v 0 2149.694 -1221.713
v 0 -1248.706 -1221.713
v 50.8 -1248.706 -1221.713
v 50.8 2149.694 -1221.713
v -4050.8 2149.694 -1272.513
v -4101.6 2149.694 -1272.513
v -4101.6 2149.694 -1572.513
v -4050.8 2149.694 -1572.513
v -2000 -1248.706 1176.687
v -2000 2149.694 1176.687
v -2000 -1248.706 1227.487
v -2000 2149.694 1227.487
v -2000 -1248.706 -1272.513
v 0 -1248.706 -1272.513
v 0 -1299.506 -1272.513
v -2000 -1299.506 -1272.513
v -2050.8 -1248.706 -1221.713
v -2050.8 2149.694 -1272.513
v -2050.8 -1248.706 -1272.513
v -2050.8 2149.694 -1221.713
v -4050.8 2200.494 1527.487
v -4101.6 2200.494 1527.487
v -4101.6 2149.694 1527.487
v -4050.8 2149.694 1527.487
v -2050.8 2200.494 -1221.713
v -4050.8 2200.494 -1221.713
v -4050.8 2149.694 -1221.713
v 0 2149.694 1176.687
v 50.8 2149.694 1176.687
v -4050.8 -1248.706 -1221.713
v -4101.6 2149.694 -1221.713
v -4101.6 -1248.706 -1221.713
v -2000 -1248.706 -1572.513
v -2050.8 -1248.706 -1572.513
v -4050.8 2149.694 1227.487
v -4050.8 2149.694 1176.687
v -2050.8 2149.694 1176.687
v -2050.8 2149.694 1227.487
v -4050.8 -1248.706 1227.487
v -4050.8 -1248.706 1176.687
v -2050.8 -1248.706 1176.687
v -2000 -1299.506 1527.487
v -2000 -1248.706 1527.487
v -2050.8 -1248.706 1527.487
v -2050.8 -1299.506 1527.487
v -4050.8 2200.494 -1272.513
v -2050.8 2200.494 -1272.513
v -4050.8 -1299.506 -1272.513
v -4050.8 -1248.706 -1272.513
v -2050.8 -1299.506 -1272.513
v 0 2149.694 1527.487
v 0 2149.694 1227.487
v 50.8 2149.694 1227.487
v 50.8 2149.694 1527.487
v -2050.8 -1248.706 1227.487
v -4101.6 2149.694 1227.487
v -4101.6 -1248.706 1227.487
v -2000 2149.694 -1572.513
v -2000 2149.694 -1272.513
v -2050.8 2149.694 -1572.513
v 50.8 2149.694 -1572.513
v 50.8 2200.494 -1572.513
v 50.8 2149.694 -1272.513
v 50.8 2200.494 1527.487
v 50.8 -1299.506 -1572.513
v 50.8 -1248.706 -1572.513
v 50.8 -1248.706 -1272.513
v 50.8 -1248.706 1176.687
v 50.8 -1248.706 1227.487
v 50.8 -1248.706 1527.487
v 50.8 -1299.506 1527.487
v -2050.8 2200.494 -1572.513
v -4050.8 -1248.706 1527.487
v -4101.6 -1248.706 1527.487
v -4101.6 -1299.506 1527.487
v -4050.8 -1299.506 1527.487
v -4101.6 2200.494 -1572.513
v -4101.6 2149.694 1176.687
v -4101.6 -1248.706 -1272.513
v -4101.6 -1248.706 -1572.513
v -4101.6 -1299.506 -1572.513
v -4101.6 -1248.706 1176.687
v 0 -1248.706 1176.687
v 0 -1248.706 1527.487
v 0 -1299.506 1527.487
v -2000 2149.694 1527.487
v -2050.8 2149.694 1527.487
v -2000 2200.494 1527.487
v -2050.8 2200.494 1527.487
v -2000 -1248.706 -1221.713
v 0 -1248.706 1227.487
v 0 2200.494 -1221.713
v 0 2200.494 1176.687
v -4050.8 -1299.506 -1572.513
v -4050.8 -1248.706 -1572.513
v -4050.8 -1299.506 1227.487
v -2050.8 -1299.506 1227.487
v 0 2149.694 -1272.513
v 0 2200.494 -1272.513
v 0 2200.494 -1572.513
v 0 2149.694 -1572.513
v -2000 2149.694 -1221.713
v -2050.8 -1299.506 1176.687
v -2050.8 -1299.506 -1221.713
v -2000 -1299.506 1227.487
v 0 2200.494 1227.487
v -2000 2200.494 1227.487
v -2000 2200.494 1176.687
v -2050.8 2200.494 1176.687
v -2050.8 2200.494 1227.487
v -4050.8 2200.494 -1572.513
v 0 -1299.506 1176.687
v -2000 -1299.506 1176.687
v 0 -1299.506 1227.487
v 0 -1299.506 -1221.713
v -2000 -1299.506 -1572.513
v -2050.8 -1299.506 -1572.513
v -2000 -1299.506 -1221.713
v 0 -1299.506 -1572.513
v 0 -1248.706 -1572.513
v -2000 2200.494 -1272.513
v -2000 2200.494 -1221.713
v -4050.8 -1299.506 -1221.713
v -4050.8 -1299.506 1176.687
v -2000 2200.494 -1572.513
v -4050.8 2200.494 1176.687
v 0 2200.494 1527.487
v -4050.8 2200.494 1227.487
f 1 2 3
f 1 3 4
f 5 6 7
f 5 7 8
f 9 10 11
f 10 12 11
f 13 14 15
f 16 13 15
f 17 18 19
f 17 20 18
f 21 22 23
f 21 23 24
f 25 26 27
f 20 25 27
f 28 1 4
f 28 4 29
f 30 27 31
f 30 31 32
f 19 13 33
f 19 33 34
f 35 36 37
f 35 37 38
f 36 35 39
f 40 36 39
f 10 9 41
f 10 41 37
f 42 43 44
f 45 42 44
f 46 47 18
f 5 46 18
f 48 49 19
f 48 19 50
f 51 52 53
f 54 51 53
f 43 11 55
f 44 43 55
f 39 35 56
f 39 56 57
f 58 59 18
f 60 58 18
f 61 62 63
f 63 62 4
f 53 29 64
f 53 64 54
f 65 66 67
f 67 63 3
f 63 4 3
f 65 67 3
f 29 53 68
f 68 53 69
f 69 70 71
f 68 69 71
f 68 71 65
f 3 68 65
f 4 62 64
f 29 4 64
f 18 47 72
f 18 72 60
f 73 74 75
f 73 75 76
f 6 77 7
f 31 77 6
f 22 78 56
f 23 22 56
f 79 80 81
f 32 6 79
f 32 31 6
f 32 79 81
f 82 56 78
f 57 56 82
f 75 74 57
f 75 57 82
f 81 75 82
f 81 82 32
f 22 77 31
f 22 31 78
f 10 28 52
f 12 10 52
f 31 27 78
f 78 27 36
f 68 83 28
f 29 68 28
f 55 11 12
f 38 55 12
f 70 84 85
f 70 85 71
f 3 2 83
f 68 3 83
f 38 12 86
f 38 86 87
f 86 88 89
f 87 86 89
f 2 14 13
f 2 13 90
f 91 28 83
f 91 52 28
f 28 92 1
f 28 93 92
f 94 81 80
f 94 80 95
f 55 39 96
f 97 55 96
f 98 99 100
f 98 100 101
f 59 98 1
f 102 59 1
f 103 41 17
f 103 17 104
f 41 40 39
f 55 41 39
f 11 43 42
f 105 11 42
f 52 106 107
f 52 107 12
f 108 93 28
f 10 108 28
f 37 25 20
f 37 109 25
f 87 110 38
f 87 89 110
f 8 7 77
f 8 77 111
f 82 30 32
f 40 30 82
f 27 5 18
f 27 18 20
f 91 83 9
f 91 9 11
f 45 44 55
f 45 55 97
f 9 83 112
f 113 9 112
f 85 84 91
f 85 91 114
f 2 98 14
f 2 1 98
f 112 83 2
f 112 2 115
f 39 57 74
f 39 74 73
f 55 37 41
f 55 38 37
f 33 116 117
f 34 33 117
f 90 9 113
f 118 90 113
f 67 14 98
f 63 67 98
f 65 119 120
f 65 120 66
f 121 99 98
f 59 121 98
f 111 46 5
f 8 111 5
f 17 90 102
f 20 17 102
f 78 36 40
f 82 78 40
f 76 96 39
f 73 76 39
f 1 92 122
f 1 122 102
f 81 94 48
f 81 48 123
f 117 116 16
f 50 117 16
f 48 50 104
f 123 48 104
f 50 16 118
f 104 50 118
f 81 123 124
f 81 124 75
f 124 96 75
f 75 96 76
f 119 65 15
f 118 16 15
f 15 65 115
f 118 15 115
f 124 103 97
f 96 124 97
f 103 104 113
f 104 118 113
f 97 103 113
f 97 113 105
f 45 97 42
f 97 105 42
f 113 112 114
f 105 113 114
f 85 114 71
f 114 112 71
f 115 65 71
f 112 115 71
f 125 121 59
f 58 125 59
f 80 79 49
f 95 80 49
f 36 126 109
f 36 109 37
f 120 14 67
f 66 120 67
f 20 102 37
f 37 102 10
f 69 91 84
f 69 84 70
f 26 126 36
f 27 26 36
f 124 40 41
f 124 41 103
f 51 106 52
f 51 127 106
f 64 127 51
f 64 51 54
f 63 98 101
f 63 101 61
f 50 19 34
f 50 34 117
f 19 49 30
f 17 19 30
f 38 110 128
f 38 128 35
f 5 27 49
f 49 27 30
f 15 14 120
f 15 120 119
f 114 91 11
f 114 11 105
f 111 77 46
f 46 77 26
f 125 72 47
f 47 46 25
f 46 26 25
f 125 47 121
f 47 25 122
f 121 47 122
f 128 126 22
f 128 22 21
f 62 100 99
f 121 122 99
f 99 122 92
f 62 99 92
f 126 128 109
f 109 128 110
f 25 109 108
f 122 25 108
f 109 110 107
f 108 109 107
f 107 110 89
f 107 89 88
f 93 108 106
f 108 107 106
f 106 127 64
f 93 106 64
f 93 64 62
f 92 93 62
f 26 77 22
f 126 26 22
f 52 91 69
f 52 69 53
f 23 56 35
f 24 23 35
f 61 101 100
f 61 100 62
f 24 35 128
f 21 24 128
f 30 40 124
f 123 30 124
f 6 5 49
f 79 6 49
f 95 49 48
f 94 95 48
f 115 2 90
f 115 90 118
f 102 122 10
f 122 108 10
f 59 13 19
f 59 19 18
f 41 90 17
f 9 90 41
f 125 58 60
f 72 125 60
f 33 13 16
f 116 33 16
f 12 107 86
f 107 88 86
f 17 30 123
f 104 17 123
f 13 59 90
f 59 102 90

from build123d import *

# Parameters (mm, degrees)
F0_W      = 3500
F0_H      = 2500
F0_W_2    = 3398.4
F0_H_2    = 2398.4
F1_DEPTH  = 50.8
F2_W      = 50.8
F2_H      = 50.8
F3_DEPTH  = 300
F4_W      = 50.8
F4_H      = 50.8
F5_DEPTH  = 300
F6_W      = 50.8
F6_H      = 50.8
F7_DEPTH  = 1000
F9_W      = 50.8
F9_H      = 50.8
F10_DEPTH = 2000
F11_W     = 3500
F11_H     = 2500
F11_W_2   = 3398.4
F11_H_2   = 2398.4
F12_DEPTH = 50.8
F13_W     = 50.8
F13_H     = 50.8
F14_DEPTH = 300
F15_W     = 50.8
F15_H     = 50.8
F16_DEPTH = 300


with BuildPart() as f1:
    # F0 (on Right) → F1 (new body)
    with BuildSketch(Plane.YZ):
        with Locations((450.493536, -22.512738)):
            Rectangle(F0_W, F0_H)
        with Locations((450.493536, -22.512738)):
            Rectangle(F0_W_2, F0_H_2, mode=Mode.SUBTRACT)
    extrude(amount=F1_DEPTH)

    # F2 (on face) → F3 (join)
    with BuildSketch(Plane.XY.offset(1227.487262)):
        with Locations((25.4, -1274.106464)):
            Rectangle(F2_W, F2_H)
        with Locations((25.4, 2175.093536)):
            Rectangle(F2_W, F2_H)
    extrude(amount=F3_DEPTH)

    # F4 (on face) → F5 (join)
    with BuildSketch(Plane(origin=(0, 0, -1272.512738), x_dir=(1, 0, 0), z_dir=(0, 0, -1))):
        with Locations((25.4, 1274.106464)):
            Rectangle(F4_W, F4_H)
        with Locations((25.4, -2175.093536)):
            Rectangle(F4_W, F4_H)
    extrude(amount=F5_DEPTH)

    # F6 (on face) → F7 (join)
    with BuildSketch(Plane(origin=(0, 0, 0), x_dir=(0, -1, 0), z_dir=(-1, 0, 0))):
        with Locations((-2175.093536, 1202.087262)):
            Rectangle(F6_W, F6_H)
        with Locations((1274.106464, 1202.087262)):
            Rectangle(F6_W, F6_H)
        with Locations((-2175.093536, -1247.112738)):
            Rectangle(F6_W, F6_H)
        with Locations((1274.106464, -1247.112738)):
            Rectangle(F6_W, F6_H)
    extrude(amount=F7_DEPTH)

    # F8: F1 across face


with BuildPart() as f1_1:
    add(f1.part)
    add(f1.part.mirror(Plane(origin=(-1000, 2175.093536, 1202.087262), x_dir=(0, -1, 0), z_dir=(-1, 0, 0))))

    # F9 (on face) → F10 (join)
    with BuildSketch(Plane(origin=(-2050.8, 0, 0), x_dir=(0, -1, 0), z_dir=(-1, 0, 0))):
        with Locations((-2175.093536, 1202.087262)):
            Rectangle(F9_W, F9_H)
        with Locations((1274.106464, 1202.087262)):
            Rectangle(F9_W, F9_H)
        with Locations((-2175.093536, -1247.112738)):
            Rectangle(F9_W, F9_H)
        with Locations((1274.106464, -1247.112738)):
            Rectangle(F9_W, F9_H)
    extrude(amount=F10_DEPTH)

    # F11 (on face) → F12 (join)
    with BuildSketch(Plane(origin=(-4050.8, 0, 0), x_dir=(0, -1, 0), z_dir=(-1, 0, 0))):
        with Locations((-450.493536, -22.512738)):
            Rectangle(F11_W, F11_H)
        with Locations((-450.493536, -22.512738)):
            Rectangle(F11_W_2, F11_H_2, mode=Mode.SUBTRACT)
    extrude(amount=F12_DEPTH)

    # F13 (on face) → F14 (join)
    with BuildSketch(Plane.XY.offset(1227.487262)):
        with Locations((-4076.2, 2175.093536)):
            Rectangle(F13_W, F13_H)
        with Locations((-4076.2, -1274.106464)):
            Rectangle(F13_W, F13_H)
    extrude(amount=F14_DEPTH)

    # F15 (on face) → F16 (join)
    with BuildSketch(Plane(origin=(0, 0, -1272.512738), x_dir=(1, 0, 0), z_dir=(0, 0, -1))):
        with Locations((-4076.2, -2175.093536)):
            Rectangle(F15_W, F15_H)
        with Locations((-4076.2, 1274.106464)):
            Rectangle(F15_W, F15_H)
    extrude(amount=F16_DEPTH)


solid = f1_1.part
